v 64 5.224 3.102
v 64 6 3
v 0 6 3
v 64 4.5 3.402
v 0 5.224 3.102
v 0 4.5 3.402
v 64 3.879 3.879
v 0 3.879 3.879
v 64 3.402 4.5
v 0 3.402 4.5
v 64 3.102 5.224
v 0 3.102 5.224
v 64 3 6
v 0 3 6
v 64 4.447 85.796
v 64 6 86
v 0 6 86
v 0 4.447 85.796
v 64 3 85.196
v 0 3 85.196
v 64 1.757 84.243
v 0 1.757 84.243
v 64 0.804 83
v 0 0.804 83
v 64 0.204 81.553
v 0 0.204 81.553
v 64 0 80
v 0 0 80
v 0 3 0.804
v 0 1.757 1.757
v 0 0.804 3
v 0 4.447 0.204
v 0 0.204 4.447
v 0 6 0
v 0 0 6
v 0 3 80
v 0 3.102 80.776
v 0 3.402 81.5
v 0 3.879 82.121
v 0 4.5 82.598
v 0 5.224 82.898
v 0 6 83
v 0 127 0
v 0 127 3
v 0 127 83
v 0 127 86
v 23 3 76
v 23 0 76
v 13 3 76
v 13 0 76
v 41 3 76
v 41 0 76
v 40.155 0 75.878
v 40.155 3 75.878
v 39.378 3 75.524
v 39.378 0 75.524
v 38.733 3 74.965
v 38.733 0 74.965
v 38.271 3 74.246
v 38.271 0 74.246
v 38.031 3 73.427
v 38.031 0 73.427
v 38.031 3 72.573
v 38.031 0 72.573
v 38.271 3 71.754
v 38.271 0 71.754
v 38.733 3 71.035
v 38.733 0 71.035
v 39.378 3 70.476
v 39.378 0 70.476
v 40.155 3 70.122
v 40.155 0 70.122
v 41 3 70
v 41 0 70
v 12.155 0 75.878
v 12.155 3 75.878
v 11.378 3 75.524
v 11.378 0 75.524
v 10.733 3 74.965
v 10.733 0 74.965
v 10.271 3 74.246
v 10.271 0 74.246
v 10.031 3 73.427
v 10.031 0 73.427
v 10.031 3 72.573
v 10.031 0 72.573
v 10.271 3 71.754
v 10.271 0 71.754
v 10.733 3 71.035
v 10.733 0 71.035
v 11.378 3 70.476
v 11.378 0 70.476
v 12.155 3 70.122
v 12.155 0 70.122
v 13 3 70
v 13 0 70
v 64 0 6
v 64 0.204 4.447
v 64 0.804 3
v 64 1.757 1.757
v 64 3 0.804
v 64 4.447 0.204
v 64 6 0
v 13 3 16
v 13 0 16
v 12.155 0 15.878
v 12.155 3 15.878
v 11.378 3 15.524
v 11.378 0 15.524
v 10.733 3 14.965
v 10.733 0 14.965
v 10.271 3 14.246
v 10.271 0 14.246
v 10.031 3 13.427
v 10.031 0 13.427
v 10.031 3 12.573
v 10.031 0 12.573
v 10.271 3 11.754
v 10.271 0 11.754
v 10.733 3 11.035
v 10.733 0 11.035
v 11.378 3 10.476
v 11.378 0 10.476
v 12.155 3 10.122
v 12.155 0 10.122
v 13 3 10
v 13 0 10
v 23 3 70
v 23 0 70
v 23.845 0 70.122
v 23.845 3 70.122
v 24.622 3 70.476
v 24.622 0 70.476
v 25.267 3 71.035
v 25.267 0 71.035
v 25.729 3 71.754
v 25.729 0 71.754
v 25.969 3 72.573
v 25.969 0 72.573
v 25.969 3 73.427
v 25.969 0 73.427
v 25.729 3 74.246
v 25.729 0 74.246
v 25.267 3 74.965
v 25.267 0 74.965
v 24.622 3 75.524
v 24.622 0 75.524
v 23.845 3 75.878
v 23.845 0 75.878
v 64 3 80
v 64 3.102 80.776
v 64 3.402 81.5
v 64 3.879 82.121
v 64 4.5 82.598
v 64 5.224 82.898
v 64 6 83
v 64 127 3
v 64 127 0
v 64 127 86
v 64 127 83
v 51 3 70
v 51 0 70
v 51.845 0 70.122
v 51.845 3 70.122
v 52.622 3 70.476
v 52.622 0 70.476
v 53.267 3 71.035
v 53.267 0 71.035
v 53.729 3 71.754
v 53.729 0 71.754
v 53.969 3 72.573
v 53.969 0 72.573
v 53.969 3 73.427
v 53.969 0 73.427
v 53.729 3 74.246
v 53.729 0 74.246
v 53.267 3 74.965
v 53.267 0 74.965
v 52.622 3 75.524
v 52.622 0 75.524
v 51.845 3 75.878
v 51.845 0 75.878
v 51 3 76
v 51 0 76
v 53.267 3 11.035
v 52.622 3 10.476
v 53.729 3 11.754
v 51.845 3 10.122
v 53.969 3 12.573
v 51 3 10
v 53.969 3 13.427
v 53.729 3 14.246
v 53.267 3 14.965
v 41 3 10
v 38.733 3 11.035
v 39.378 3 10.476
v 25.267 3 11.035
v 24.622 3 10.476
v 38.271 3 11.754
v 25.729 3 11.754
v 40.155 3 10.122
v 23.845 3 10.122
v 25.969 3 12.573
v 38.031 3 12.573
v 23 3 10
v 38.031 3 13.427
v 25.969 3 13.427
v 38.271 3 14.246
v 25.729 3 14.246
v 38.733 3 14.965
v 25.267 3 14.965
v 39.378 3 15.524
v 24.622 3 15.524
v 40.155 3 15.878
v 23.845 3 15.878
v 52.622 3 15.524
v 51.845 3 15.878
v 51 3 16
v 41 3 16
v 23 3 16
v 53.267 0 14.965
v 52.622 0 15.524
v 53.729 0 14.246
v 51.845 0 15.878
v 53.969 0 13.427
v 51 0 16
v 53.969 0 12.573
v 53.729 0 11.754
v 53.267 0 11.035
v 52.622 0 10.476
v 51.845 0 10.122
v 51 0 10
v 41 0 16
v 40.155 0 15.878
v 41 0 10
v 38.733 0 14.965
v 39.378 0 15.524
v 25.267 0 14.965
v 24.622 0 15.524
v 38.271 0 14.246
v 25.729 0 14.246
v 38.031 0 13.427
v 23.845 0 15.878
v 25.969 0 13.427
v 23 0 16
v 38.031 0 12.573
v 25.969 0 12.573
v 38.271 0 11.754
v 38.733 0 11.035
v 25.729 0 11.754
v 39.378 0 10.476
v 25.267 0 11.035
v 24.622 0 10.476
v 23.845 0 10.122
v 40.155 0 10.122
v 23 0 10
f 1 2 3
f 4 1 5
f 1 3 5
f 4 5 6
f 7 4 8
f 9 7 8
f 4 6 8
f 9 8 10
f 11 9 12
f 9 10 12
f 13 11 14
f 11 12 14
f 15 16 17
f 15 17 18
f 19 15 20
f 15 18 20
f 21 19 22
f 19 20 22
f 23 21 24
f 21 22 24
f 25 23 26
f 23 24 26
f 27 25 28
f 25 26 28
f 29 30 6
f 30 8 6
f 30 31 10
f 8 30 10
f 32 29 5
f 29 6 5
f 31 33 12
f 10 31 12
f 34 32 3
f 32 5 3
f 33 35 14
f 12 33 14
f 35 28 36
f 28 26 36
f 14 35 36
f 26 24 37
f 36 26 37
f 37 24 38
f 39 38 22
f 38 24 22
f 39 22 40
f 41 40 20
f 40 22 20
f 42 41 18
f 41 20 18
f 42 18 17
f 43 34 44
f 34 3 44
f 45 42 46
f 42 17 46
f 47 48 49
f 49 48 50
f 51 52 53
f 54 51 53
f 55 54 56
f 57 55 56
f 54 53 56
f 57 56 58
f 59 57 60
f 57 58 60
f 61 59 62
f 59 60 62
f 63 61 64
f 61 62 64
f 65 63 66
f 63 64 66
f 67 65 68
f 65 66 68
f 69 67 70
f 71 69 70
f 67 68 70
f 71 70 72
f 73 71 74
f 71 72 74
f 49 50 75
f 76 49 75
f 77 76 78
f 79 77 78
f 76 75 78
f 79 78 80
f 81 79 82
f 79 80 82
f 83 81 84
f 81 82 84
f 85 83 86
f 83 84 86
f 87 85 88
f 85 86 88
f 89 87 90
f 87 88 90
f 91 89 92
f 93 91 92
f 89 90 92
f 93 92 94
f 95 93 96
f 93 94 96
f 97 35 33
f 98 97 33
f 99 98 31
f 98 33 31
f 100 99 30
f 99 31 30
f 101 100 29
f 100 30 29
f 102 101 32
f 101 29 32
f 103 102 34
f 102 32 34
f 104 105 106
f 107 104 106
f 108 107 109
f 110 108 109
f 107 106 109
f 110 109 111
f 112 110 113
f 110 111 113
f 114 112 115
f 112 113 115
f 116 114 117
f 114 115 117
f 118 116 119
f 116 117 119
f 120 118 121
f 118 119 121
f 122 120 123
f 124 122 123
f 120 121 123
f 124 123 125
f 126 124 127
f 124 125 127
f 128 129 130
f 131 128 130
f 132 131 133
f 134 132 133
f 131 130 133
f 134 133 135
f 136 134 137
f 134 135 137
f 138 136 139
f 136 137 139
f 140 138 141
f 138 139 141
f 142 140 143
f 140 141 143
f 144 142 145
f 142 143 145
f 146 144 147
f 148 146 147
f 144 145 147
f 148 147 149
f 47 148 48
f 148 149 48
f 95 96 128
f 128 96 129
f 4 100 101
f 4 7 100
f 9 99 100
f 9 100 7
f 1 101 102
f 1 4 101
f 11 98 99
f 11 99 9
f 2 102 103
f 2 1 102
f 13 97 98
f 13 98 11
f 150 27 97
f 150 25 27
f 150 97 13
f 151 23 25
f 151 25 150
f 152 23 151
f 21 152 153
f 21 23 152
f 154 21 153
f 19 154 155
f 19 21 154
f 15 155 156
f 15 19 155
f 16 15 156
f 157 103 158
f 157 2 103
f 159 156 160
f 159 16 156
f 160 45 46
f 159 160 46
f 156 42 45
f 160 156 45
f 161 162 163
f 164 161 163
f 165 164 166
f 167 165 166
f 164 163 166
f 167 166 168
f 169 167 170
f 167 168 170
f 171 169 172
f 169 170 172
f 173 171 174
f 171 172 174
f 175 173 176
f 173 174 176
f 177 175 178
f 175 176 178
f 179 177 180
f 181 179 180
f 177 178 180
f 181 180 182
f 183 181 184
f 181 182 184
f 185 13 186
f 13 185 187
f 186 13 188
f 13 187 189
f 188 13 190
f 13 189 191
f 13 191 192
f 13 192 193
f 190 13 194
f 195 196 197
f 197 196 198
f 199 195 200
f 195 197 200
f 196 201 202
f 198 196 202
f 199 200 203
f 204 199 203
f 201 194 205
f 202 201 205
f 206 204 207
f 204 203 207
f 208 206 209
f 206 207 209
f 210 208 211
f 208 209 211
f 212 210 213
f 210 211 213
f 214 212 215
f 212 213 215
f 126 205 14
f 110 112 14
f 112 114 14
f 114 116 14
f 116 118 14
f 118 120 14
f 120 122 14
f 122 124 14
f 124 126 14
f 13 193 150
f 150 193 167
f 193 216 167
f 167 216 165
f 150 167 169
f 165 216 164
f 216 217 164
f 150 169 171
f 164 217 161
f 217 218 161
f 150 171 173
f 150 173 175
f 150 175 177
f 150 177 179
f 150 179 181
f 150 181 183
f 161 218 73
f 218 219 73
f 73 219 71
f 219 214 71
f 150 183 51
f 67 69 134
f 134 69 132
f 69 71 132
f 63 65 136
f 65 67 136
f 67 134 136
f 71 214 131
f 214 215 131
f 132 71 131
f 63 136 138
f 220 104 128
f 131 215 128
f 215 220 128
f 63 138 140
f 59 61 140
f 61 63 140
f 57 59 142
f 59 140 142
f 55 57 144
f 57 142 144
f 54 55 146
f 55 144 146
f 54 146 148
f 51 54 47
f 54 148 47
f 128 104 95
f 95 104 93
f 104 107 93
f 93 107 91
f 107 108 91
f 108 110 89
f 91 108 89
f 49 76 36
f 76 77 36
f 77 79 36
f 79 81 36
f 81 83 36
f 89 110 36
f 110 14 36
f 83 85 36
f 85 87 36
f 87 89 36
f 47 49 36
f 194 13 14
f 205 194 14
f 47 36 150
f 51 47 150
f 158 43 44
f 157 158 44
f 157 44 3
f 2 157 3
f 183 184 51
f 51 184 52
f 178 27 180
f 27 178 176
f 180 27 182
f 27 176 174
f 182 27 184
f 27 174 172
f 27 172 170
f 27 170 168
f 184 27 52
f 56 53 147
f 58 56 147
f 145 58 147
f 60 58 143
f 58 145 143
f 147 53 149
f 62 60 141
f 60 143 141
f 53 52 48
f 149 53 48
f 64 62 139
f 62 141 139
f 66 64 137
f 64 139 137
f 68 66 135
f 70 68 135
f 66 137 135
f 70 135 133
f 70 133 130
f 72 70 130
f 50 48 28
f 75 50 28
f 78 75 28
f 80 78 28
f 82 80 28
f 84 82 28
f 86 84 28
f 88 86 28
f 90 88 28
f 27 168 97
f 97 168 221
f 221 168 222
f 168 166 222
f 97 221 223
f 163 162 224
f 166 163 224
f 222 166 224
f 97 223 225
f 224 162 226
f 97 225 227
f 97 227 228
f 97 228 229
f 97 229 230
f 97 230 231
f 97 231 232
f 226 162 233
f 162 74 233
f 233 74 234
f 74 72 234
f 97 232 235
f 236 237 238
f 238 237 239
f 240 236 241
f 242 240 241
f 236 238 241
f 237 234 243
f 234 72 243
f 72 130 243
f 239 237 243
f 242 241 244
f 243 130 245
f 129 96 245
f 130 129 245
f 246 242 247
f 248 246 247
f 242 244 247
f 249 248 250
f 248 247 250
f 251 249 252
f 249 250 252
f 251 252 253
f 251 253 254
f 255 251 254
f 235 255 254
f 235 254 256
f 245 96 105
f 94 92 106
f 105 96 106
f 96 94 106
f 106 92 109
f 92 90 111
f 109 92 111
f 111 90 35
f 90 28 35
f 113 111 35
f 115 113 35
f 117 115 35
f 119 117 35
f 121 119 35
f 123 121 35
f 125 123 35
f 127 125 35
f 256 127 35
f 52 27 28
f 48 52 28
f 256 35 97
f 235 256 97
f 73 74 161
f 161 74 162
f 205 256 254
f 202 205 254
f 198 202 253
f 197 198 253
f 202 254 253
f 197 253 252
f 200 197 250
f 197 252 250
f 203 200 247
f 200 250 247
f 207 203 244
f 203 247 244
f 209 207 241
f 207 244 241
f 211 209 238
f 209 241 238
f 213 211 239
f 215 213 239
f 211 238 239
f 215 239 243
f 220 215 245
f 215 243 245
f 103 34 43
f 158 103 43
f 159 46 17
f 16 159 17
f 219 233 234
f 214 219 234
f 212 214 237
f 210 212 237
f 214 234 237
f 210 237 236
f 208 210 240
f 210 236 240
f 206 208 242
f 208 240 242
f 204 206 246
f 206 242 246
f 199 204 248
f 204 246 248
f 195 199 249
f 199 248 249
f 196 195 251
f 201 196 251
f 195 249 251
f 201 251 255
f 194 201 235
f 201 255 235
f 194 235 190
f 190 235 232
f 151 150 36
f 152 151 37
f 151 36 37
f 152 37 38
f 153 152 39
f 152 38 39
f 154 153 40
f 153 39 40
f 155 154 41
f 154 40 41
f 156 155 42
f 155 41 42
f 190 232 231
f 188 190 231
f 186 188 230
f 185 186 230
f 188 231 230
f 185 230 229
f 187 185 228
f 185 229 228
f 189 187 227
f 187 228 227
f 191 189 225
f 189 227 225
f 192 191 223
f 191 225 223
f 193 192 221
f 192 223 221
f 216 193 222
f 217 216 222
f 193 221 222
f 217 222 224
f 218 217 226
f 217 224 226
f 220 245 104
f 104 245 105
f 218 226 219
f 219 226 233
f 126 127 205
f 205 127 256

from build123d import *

# Parameters (mm, degrees)
F1_DEPTH = 64
F3_DEPTH = 3


with BuildPart() as f1:
    # F0 (on Right) → F1 (new body)
    with BuildSketch(Plane.YZ):
        with BuildLine():
            Line((0, 80), (0, 6))
            ThreePointArc((0, 6), (1.757359, 1.757359), (6, 0))
            Line((6, 0), (127, 0))
            Line((127, 0), (127, 3))
            Line((127, 3), (6, 3))
            ThreePointArc((6, 3), (3.87868, 3.87868), (3, 6))
            Line((3, 6), (3, 80))
            ThreePointArc((3, 80), (3.87868, 82.12132), (6, 83))
            Line((6, 83), (127, 83))
            Line((127, 83), (127, 86))
            Line((127, 86), (6, 86))
            ThreePointArc((6, 86), (1.757359, 84.242641), (0, 80))
        make_face()
    extrude(amount=F1_DEPTH)

    # F2 (on face) → F3 (cut, through all)
    with BuildSketch(Plane.XZ):
        with BuildLine():
            ThreePointArc((13, 76), (10, 73), (13, 70))
            Line((13, 70), (23, 70))
            ThreePointArc((23, 70), (26, 73), (23, 76))
            Line((23, 76), (13, 76))
        make_face()
        with BuildLine():
            Line((51, 76), (41, 76))
            ThreePointArc((41, 76), (38, 73), (41, 70))
            Line((41, 70), (51, 70))
            ThreePointArc((51, 70), (54, 73), (51, 76))
        make_face()
        with BuildLine():
            ThreePointArc((41, 16), (38, 13), (41, 10))
            Line((41, 10), (51, 10))
            ThreePointArc((51, 10), (54, 13), (51, 16))
            Line((51, 16), (41, 16))
        make_face()
        with BuildLine():
            Line((23, 16), (13, 16))
            ThreePointArc((13, 16), (10, 13), (13, 10))
            Line((13, 10), (23, 10))
            ThreePointArc((23, 10), (26, 13), (23, 16))
        make_face()
    extrude(amount=-F3_DEPTH, mode=Mode.SUBTRACT)


solid = f1.part
